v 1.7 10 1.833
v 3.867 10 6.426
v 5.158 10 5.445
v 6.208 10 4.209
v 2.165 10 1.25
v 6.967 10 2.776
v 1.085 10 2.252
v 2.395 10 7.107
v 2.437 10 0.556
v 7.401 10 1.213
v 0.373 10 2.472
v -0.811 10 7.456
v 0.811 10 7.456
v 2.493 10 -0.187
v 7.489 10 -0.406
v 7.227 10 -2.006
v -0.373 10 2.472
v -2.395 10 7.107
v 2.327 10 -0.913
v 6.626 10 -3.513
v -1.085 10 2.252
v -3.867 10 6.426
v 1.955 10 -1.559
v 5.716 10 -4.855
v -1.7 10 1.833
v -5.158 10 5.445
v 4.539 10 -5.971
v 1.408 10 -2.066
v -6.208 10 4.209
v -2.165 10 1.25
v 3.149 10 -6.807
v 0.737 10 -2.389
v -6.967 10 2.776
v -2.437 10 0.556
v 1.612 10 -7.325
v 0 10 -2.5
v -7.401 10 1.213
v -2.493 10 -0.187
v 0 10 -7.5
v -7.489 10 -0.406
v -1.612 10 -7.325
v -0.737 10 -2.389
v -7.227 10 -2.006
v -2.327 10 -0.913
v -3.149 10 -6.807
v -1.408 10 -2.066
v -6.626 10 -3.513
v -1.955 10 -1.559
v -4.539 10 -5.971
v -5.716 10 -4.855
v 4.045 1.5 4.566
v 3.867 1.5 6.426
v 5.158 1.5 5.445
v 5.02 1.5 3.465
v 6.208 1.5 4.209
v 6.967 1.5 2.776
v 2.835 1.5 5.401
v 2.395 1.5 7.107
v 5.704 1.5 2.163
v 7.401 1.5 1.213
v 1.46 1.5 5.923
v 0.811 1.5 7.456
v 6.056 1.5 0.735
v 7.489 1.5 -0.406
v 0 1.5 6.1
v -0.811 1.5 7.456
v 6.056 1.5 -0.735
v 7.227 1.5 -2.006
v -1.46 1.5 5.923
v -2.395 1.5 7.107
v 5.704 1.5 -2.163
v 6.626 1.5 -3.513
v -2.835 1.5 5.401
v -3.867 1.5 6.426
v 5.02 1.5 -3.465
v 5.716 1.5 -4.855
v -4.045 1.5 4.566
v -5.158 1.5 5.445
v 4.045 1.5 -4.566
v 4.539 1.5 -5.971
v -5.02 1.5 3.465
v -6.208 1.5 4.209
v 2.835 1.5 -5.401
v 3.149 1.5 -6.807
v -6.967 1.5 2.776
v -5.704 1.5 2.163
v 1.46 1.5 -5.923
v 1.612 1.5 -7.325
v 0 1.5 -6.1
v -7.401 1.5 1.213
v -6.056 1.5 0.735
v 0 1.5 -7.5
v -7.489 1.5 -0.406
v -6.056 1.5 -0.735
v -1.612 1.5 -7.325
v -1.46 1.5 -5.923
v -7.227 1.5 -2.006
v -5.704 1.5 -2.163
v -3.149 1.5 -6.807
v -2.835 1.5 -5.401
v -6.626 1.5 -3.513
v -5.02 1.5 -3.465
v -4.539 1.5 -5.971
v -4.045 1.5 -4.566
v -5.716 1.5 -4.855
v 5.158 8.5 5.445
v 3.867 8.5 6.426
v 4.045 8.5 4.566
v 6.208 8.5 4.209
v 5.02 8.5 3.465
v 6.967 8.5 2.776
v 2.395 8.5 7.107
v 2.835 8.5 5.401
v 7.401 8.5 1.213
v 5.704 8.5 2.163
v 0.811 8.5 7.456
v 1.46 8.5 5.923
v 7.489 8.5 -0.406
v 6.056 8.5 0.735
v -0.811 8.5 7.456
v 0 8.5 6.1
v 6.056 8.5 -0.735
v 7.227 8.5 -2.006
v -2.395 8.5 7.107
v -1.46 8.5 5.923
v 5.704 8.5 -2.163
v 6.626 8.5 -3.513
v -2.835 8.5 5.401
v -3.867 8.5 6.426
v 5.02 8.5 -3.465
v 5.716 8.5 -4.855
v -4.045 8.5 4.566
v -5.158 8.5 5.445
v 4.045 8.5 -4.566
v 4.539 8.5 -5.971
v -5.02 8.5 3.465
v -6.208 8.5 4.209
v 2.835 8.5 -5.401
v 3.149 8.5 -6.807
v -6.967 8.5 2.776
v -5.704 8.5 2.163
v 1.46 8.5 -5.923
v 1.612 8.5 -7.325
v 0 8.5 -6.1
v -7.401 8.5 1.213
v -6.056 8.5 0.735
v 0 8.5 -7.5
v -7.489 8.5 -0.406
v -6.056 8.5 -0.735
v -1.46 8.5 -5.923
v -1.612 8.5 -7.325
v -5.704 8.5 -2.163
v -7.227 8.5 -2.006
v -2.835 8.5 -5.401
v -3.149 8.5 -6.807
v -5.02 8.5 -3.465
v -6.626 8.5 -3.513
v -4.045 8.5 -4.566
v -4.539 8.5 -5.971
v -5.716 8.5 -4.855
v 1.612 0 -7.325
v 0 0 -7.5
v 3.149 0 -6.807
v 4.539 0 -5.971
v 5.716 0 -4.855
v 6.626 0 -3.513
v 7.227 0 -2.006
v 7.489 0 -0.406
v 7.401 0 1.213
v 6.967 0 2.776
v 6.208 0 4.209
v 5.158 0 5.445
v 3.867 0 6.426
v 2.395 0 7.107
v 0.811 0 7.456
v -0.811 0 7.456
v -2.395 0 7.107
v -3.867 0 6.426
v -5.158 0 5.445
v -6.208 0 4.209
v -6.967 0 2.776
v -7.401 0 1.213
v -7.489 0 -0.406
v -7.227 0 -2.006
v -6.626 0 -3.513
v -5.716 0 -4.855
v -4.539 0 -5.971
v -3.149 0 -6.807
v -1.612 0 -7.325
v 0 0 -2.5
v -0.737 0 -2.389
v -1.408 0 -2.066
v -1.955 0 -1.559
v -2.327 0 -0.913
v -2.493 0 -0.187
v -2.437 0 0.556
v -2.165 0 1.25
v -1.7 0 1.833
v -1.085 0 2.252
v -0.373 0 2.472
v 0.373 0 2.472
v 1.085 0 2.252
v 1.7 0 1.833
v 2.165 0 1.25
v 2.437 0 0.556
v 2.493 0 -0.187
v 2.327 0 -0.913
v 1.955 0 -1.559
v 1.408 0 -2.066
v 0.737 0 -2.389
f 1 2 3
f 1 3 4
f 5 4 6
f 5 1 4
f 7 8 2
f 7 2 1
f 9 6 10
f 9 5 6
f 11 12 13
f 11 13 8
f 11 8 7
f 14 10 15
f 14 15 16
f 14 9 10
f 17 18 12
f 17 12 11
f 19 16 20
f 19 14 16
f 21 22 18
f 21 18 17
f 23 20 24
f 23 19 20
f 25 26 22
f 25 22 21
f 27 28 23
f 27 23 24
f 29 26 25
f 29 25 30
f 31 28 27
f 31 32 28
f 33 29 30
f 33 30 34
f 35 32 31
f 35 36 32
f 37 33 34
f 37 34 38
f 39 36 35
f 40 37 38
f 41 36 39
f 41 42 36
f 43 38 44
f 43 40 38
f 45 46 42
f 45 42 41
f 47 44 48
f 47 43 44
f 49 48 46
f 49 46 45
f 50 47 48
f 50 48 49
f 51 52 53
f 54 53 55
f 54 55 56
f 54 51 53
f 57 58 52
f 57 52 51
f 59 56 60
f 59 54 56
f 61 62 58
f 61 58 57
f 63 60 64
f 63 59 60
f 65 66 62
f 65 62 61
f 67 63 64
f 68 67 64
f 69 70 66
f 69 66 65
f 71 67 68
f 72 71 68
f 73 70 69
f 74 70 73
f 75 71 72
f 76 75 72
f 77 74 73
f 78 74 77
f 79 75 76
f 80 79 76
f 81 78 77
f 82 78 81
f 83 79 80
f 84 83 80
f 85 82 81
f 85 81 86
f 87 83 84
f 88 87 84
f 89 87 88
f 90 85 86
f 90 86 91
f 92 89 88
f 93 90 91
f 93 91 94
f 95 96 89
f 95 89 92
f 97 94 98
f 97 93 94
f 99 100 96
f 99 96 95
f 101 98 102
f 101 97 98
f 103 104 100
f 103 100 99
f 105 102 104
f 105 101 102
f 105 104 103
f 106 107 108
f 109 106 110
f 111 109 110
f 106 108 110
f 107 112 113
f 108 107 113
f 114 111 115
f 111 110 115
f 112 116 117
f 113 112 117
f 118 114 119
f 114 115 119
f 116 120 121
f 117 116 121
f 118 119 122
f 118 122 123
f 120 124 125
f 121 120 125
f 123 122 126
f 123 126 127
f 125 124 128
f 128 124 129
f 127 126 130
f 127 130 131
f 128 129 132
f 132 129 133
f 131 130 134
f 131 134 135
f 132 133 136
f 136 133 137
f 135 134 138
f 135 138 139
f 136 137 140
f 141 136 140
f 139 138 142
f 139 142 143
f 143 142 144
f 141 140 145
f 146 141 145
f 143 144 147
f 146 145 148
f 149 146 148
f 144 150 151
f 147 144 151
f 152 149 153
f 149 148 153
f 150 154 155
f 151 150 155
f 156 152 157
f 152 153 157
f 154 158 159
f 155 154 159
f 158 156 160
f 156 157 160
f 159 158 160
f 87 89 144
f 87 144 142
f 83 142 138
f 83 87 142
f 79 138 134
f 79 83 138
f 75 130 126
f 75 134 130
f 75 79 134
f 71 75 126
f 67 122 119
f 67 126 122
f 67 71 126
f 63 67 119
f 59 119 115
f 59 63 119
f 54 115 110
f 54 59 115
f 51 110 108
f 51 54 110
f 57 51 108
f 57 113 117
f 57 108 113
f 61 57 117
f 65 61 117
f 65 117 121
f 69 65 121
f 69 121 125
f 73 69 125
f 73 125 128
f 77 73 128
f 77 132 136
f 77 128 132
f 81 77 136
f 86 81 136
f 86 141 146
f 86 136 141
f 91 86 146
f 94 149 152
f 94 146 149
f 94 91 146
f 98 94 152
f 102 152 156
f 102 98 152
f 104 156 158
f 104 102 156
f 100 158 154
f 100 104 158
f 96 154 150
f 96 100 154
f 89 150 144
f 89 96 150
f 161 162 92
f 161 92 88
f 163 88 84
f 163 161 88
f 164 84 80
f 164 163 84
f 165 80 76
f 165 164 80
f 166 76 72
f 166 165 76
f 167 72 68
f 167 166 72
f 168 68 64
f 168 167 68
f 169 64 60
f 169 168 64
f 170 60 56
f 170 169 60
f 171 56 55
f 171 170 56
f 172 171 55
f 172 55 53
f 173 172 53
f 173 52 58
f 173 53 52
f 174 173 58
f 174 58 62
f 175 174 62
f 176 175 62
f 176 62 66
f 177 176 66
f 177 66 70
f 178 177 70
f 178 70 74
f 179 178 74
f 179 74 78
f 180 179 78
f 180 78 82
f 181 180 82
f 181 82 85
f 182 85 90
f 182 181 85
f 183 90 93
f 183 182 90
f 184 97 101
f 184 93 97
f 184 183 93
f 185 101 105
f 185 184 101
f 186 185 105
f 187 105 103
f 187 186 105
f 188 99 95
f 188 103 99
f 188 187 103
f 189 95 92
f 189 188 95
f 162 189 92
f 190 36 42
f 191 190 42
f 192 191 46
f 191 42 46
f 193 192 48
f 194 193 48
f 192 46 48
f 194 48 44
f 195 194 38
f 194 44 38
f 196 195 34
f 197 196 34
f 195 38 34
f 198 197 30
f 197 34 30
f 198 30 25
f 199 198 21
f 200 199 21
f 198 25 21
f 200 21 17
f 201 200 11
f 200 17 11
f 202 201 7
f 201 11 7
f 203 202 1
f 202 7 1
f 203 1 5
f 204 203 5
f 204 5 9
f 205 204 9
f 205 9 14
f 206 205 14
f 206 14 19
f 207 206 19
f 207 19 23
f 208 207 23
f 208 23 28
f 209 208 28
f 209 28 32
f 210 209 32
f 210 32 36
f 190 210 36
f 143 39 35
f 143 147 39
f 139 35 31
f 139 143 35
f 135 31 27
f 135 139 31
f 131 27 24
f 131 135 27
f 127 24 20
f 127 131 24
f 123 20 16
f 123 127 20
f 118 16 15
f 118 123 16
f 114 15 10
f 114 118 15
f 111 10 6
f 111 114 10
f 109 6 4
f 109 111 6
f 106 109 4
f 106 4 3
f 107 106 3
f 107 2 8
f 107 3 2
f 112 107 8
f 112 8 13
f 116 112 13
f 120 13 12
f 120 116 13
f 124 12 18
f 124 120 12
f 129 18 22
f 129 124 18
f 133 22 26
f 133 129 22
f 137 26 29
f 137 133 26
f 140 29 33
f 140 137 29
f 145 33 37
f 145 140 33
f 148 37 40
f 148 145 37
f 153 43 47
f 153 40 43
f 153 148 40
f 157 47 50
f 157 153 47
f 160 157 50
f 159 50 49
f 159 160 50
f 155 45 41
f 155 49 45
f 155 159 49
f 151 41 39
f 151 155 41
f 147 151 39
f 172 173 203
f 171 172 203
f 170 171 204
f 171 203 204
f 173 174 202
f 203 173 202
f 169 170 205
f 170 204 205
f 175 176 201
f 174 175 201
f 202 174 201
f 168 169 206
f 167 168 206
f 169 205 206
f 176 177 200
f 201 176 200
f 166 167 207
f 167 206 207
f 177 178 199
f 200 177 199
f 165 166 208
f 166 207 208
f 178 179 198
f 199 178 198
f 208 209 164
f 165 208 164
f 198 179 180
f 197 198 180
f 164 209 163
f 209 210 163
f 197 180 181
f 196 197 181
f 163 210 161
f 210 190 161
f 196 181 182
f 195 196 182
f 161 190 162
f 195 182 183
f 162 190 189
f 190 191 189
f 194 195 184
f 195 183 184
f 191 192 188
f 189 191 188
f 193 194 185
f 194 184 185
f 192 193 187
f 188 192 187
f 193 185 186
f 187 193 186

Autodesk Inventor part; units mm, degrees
ref_plane "YZ Plane" through (0, 0, 0) normal (1, 0, 0) x (0, 1, 0)
ref_plane "XZ Plane" through (0, 0, 0) normal (0, 1, 0) x (-1, 0, 0)
ref_plane "XY Plane" through (0, 0, 0) normal (0, 0, 1) x (1, 0, 0)
sketch "Sketch1" plane through (0, 0, 0) normal (1, 0, 0) x (0, 1, 0)
  line L0 (0, 0) -> (17.2785, 0)
  line L1 (0, -2.5) -> (10, -2.5)
  line L2 (10, -2.5) -> (10, -7.5)
  line L3 (10, -7.5) -> (8.5, -7.5)
  line L4 (8.5, -7.5) -> (8.5, -6.1)
  line L5 (8.5, -6.1) -> (1.5, -6.1)
  line L6 (1.5, -6.1) -> (1.5, -7.5)
  line L7 (1.5, -7.5) -> (0, -7.5)
  line L8 (0, -7.5) -> (0, -2.5)
  point P0 (5, -2.5)
  dimension "d1" = 5
  dimension "d2" = 15
  dimension "d3" = 12.2
  dimension "d4" = 7
  dimension "d5" = 1.5
revolve "Revolution1" add sketch "Sketch1" angle 360 about axis through (0, 0, 0) along (0, 1, 0)
properties part number "6mm toothed idler" material "Aluminum 6061"
